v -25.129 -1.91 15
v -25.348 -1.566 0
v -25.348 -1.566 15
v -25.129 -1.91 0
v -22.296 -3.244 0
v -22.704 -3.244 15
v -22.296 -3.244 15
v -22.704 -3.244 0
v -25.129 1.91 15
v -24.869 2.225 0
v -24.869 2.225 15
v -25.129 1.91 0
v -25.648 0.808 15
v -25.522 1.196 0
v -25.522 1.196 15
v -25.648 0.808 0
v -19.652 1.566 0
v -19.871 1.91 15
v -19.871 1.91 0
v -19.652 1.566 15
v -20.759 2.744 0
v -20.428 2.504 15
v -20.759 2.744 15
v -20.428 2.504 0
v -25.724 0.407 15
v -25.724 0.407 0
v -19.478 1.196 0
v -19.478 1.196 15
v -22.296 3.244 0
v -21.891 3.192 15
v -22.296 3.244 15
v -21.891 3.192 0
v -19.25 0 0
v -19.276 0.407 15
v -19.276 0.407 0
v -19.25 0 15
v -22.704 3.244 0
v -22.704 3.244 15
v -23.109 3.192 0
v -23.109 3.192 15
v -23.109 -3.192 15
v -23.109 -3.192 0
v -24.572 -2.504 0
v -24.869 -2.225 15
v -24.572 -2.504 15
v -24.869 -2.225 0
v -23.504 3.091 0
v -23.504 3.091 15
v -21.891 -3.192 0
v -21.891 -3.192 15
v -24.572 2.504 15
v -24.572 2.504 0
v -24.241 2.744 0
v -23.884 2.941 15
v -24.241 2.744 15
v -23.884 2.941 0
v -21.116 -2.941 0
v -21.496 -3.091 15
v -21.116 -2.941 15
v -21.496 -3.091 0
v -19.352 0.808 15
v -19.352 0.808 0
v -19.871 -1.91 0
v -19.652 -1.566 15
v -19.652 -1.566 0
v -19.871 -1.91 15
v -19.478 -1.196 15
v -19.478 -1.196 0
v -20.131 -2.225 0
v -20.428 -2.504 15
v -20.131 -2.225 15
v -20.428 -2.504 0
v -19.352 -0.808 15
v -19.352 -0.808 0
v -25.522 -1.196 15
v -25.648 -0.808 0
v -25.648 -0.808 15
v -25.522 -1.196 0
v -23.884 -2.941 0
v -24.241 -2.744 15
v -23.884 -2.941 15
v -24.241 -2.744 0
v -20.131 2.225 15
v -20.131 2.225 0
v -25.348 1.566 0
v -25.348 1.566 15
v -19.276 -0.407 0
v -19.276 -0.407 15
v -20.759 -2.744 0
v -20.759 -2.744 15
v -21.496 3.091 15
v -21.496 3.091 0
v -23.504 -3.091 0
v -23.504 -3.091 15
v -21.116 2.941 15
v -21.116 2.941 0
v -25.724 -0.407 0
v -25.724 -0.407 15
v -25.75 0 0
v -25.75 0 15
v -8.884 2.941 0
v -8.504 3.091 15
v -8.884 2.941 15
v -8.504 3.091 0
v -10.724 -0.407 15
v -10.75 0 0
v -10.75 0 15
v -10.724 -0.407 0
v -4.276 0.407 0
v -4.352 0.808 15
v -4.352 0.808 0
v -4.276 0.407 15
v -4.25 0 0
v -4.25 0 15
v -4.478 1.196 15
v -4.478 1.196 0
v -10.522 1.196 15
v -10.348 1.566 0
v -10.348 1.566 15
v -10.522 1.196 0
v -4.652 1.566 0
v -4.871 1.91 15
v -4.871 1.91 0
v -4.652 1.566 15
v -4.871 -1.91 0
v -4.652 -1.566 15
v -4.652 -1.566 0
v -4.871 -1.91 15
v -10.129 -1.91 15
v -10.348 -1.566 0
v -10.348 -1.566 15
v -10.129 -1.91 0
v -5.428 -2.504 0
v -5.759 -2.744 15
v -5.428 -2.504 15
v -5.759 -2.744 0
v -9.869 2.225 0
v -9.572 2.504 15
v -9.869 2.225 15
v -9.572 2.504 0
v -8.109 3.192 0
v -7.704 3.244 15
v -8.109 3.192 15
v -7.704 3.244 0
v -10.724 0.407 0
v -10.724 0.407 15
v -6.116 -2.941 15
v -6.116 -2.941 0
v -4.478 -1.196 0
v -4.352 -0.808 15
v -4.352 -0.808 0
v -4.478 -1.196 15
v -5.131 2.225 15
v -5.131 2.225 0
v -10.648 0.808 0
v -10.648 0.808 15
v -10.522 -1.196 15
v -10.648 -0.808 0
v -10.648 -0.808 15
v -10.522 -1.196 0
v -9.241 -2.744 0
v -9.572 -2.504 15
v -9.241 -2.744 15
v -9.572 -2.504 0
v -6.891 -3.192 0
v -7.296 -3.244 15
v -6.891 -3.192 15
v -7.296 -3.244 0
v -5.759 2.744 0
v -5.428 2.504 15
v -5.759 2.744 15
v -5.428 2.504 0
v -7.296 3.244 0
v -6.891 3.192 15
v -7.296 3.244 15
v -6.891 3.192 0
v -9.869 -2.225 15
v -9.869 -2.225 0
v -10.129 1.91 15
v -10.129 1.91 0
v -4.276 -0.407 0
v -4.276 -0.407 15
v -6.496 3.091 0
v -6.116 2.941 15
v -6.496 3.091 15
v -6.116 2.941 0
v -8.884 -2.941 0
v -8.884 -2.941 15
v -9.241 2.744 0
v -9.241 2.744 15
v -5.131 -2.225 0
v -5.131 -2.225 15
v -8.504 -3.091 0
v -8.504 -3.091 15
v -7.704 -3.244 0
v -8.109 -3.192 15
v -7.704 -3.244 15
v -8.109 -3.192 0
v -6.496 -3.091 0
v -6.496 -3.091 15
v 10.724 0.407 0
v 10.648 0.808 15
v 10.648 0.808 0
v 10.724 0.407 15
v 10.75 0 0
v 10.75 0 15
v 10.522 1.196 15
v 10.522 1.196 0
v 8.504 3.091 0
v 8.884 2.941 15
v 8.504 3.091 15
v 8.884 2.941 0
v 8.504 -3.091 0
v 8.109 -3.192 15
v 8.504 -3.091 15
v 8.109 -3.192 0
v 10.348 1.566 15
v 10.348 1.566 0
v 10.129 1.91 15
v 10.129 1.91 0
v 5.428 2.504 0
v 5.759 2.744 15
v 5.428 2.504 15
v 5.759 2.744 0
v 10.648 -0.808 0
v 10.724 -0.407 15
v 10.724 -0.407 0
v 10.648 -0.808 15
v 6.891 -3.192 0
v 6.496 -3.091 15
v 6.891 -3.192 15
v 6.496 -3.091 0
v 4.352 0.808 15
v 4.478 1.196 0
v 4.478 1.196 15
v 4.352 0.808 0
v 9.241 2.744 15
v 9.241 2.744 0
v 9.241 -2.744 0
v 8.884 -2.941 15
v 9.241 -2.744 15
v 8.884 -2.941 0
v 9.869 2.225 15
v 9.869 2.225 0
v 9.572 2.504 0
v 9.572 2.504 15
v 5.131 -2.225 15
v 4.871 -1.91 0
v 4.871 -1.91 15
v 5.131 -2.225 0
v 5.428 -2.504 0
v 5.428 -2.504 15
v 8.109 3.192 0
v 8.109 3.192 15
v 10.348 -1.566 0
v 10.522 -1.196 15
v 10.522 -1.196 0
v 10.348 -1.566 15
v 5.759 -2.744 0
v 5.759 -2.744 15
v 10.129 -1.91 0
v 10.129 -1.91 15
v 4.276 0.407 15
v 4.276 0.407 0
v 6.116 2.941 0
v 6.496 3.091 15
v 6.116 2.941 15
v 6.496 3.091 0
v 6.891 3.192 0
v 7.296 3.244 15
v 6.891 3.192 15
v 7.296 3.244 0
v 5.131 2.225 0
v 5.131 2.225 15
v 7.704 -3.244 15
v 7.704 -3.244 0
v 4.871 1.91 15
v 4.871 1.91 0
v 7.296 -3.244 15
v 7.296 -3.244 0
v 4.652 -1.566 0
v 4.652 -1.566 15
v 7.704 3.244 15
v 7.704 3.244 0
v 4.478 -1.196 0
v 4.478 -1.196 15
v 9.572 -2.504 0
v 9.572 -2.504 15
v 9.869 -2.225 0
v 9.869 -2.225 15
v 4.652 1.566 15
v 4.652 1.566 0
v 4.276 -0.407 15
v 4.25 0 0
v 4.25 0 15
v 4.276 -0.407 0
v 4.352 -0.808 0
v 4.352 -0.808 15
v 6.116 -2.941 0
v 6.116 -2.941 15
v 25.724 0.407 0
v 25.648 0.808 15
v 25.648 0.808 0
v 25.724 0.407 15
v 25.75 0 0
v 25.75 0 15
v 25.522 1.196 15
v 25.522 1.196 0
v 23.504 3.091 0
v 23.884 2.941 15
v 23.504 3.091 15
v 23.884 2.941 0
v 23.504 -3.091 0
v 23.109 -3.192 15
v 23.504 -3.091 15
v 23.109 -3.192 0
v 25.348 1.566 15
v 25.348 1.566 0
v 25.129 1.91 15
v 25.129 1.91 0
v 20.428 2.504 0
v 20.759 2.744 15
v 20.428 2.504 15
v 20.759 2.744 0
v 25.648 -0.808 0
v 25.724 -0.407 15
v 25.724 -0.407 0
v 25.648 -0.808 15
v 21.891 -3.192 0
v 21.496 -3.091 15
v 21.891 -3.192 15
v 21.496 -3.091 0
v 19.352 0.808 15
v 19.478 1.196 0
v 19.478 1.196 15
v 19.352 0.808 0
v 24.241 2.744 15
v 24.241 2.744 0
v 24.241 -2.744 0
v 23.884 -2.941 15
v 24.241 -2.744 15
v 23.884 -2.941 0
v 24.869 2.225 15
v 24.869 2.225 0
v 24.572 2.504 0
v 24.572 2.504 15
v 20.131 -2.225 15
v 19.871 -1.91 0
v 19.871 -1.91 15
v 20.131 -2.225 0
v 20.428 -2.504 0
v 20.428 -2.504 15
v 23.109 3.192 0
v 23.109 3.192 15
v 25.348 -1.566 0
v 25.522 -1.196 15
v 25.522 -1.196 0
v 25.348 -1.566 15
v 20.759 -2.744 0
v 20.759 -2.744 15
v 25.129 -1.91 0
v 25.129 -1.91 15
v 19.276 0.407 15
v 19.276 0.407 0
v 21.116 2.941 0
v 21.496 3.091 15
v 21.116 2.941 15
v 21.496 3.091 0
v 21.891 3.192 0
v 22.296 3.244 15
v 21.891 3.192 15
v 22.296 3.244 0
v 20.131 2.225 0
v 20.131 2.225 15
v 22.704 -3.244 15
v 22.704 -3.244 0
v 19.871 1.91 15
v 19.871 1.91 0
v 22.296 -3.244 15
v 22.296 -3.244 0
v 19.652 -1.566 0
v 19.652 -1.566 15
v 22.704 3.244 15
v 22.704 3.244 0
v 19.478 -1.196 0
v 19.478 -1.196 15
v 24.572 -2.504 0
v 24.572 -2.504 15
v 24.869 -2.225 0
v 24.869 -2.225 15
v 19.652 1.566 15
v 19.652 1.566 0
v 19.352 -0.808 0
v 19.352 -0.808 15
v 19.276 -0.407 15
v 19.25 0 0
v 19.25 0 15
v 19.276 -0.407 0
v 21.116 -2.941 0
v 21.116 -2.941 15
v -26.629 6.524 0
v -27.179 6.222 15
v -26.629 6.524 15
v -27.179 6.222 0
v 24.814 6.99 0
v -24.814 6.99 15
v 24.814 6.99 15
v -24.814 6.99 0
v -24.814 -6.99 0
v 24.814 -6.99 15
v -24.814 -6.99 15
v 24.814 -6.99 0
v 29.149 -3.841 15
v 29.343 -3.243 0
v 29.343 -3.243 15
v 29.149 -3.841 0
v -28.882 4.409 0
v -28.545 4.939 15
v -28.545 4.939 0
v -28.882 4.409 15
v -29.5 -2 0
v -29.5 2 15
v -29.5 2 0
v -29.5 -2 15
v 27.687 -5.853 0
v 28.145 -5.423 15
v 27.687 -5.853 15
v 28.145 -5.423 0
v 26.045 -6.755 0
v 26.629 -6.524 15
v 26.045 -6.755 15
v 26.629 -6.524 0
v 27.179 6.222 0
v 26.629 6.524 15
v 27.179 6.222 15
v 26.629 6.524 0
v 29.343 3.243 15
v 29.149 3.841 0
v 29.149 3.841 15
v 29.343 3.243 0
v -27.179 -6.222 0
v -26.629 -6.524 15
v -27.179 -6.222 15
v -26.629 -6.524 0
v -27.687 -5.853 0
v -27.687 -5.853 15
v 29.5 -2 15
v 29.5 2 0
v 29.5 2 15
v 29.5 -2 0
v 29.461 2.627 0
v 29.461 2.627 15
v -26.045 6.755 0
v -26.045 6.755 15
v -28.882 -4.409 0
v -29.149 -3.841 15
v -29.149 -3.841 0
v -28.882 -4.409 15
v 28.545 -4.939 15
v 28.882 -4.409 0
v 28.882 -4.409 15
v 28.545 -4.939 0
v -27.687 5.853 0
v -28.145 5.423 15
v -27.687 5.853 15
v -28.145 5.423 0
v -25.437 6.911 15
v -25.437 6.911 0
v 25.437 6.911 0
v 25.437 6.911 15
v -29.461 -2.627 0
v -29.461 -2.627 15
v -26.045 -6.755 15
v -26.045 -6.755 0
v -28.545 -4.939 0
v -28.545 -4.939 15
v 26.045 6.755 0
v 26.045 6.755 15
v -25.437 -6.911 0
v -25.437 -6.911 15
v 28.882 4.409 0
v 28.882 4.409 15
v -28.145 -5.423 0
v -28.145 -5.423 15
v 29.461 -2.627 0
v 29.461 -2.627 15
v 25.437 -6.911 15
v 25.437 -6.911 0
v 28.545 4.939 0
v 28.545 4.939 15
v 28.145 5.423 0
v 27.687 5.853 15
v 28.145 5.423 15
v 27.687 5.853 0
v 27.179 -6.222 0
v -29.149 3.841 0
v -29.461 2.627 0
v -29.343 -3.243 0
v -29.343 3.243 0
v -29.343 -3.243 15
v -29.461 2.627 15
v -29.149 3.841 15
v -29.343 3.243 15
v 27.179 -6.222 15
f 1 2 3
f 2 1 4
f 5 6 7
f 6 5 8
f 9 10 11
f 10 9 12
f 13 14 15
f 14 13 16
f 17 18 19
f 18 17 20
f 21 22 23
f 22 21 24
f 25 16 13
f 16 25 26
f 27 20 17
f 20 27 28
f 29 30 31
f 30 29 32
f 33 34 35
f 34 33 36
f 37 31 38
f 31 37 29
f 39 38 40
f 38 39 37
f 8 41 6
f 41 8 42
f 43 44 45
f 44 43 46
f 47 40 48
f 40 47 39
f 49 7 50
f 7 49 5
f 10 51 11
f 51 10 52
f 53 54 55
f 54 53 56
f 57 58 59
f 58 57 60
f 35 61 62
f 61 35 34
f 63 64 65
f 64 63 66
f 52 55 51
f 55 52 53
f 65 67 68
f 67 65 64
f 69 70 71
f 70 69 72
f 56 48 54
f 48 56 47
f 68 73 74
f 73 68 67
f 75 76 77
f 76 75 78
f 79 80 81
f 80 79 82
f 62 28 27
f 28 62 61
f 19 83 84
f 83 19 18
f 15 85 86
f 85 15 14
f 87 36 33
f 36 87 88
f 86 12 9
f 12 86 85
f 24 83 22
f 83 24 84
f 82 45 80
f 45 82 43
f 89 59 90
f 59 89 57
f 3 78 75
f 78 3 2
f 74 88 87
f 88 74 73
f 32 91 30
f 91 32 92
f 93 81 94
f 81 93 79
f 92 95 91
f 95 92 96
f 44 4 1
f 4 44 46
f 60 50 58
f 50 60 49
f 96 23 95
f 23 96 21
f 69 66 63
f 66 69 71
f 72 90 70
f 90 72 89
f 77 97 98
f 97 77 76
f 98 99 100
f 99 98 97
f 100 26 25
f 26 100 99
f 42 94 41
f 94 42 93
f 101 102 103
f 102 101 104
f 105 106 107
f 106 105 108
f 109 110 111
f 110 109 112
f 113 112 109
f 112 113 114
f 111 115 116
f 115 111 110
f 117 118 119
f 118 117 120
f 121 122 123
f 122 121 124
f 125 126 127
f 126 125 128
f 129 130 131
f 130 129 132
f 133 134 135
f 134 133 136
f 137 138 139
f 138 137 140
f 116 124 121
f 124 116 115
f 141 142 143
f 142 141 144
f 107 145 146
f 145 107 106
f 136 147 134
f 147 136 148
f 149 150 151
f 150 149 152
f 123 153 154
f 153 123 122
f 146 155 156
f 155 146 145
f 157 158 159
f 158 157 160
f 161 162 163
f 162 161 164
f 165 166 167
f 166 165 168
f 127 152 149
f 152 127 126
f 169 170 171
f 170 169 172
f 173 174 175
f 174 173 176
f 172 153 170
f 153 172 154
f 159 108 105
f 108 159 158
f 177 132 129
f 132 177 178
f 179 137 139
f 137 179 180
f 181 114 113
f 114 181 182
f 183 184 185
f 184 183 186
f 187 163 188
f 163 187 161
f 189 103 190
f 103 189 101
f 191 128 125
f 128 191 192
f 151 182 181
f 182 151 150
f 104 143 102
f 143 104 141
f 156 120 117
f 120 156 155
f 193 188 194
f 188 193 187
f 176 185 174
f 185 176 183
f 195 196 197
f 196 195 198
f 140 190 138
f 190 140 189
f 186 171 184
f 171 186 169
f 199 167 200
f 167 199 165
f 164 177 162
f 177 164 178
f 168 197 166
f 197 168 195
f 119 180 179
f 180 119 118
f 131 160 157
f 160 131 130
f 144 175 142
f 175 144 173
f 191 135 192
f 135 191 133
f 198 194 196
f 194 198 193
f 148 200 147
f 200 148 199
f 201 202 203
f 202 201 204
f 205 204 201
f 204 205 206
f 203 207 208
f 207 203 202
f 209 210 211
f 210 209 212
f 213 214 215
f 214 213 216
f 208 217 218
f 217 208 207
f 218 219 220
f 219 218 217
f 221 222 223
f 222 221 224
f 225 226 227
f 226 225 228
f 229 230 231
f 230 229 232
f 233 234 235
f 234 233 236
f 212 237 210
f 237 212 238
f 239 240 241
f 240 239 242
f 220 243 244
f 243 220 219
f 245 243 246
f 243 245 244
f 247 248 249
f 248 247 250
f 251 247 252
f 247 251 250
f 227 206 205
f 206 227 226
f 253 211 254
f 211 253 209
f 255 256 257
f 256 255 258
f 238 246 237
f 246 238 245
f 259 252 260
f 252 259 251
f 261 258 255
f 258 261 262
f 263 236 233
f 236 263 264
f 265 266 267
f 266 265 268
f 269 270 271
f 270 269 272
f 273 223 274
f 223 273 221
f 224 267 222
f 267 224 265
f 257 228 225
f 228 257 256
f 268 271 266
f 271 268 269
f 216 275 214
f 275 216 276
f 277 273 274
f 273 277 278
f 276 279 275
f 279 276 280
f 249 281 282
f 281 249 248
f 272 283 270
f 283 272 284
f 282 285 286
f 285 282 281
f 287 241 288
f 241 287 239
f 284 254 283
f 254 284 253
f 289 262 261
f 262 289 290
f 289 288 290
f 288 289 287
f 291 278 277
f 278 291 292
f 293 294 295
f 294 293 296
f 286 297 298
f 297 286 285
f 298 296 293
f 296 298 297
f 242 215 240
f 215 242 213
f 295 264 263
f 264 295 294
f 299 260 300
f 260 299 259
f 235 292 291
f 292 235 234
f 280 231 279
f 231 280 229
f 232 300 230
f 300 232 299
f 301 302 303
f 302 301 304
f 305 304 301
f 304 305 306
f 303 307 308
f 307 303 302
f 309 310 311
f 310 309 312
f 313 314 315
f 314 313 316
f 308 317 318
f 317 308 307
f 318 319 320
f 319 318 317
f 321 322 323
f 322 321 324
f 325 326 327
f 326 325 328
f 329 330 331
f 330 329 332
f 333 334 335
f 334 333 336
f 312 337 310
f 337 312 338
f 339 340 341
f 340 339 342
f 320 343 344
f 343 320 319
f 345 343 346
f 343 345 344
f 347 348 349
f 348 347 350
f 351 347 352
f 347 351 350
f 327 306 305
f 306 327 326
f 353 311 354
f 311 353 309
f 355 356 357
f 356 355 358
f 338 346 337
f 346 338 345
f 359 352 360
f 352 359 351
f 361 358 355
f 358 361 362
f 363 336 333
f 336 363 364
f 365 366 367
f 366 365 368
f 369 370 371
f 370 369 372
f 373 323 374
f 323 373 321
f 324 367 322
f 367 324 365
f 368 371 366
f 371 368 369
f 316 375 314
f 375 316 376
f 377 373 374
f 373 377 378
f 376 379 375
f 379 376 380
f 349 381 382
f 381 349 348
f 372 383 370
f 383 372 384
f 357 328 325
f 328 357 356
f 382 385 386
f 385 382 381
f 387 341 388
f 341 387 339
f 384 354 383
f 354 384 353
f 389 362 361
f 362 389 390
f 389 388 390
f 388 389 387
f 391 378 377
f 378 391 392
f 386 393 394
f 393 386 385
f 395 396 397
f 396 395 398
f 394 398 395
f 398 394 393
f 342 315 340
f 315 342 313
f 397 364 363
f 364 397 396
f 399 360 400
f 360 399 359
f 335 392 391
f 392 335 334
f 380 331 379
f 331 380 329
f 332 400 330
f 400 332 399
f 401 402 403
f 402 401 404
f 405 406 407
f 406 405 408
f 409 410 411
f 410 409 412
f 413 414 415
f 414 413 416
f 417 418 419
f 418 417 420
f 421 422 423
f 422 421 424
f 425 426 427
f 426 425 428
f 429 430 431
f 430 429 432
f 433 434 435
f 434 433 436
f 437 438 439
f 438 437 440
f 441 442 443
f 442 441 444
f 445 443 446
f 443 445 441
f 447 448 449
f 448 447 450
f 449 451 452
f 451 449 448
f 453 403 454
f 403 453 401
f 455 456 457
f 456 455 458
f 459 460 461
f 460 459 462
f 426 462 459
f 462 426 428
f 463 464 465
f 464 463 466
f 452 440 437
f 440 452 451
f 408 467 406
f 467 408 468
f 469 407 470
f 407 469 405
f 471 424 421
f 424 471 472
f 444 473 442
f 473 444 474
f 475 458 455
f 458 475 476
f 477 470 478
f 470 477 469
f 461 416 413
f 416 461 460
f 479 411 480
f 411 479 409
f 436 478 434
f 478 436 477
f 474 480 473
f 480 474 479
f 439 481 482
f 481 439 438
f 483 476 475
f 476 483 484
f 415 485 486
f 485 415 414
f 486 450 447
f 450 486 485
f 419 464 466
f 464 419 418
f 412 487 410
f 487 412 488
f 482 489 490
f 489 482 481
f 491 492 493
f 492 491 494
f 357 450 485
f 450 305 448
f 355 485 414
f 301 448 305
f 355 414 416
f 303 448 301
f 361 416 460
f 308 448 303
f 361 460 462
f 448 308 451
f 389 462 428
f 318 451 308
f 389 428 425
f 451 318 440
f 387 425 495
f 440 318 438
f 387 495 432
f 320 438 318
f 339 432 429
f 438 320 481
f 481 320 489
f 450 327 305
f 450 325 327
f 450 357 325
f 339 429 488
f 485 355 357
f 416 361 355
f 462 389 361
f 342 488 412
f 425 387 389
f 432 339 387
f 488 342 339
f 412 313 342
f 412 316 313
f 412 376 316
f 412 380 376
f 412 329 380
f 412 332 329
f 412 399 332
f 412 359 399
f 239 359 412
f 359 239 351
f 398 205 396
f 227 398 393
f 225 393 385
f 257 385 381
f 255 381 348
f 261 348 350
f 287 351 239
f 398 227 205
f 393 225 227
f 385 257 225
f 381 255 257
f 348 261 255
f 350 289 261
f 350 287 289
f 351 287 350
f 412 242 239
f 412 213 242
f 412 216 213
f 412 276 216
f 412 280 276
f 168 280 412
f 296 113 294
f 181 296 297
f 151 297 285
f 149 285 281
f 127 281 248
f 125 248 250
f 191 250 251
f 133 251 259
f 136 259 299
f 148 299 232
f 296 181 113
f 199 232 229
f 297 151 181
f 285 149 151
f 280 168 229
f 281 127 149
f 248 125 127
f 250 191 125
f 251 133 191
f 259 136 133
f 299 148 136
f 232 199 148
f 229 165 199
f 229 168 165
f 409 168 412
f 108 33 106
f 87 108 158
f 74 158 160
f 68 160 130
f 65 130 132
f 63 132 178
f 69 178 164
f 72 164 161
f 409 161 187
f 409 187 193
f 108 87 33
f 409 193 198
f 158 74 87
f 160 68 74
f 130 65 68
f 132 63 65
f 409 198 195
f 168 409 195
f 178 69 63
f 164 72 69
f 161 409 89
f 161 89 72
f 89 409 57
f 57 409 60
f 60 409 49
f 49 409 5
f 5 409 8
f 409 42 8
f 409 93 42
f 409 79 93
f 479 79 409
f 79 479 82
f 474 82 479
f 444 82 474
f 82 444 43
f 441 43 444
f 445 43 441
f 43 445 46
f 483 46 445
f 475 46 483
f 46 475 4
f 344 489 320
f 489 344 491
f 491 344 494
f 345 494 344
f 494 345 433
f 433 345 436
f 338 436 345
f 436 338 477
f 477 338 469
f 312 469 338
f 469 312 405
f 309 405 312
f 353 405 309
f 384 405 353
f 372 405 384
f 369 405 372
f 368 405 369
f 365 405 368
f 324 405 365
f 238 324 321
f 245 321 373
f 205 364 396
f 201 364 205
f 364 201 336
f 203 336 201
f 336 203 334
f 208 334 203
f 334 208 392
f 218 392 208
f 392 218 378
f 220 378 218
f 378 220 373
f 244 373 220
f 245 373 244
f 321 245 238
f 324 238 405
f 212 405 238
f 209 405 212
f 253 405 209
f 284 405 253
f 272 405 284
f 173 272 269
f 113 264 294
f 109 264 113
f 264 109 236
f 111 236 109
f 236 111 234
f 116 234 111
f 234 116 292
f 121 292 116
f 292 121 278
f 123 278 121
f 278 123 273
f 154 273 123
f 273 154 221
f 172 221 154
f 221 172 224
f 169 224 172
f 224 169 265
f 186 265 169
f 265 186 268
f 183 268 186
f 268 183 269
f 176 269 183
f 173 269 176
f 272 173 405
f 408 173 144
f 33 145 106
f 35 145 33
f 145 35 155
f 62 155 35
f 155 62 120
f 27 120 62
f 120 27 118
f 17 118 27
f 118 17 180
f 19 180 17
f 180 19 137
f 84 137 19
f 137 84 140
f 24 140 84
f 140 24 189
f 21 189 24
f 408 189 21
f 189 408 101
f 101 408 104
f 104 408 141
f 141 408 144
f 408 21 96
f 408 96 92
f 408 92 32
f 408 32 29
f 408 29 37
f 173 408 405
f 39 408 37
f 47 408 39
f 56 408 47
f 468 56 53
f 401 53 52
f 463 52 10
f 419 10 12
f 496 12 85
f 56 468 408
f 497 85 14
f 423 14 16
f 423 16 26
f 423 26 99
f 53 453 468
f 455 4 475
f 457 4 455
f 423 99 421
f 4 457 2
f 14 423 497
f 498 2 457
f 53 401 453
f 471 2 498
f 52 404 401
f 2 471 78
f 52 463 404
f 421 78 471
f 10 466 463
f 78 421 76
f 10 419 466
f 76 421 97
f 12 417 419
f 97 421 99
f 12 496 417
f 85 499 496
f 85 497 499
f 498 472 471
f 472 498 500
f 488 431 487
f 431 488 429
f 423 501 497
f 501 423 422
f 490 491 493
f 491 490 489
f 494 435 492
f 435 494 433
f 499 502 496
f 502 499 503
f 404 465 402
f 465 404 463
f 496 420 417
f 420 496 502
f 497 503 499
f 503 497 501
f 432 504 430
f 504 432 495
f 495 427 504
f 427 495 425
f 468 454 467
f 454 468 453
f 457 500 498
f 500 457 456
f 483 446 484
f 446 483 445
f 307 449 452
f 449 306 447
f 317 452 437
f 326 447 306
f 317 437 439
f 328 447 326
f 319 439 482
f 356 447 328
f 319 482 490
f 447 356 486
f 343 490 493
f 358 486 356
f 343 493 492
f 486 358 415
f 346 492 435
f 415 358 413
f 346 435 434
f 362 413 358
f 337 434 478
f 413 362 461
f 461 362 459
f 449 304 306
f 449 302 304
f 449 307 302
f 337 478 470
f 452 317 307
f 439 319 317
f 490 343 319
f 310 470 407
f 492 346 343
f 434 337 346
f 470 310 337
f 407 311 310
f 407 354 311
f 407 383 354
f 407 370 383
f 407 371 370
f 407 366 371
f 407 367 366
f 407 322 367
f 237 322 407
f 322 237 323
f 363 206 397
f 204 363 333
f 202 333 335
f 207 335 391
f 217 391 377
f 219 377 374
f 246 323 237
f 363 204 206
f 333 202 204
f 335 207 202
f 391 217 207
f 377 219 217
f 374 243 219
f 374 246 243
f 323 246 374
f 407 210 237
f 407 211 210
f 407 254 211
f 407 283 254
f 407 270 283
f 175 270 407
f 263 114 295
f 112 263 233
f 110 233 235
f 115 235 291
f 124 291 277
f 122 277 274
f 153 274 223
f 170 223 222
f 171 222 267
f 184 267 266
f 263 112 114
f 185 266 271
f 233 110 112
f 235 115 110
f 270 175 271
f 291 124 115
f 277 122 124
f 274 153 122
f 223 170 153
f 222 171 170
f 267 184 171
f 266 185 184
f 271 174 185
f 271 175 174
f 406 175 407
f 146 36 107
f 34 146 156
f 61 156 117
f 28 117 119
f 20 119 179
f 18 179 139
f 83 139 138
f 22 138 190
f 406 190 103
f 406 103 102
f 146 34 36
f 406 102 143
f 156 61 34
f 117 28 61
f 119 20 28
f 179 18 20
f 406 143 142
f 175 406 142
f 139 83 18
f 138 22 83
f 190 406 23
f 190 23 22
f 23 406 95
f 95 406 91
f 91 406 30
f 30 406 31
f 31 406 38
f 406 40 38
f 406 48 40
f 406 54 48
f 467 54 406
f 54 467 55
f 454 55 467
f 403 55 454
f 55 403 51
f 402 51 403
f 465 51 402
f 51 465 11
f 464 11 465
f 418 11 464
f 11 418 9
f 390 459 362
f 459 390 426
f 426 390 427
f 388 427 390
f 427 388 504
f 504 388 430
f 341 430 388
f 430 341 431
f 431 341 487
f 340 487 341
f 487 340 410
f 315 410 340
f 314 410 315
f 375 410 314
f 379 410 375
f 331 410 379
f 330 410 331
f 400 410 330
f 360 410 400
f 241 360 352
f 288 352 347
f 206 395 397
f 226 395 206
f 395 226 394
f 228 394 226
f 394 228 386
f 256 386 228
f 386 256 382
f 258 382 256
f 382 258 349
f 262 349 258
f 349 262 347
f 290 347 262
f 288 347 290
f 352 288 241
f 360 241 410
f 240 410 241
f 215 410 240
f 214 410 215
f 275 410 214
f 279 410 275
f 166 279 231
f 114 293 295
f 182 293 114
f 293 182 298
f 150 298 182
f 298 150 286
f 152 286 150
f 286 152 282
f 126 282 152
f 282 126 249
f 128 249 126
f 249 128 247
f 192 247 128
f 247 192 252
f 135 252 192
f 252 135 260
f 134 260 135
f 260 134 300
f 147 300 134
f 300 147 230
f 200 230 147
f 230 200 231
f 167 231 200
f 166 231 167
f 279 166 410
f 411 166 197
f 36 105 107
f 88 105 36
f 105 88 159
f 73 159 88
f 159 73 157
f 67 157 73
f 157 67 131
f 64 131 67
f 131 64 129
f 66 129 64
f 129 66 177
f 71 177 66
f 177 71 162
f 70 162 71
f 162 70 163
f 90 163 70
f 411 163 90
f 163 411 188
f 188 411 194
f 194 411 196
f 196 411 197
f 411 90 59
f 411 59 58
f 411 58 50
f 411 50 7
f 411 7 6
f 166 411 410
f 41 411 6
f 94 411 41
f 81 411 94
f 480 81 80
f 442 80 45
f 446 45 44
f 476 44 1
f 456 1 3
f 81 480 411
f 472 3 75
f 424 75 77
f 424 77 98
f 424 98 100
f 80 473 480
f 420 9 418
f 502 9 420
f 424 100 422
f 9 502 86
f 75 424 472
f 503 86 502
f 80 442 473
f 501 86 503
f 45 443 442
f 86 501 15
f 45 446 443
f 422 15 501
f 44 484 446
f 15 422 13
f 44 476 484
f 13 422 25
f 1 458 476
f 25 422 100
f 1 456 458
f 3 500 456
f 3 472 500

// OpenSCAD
$fn = 50;


difference() {
	union() {
		hull() {
			translate(v = [-24.5000000000, 2.0000000000, 0]) {
				cylinder(h = 15, r = 5);
			}
			translate(v = [24.5000000000, 2.0000000000, 0]) {
				cylinder(h = 15, r = 5);
			}
			translate(v = [-24.5000000000, -2.0000000000, 0]) {
				cylinder(h = 15, r = 5);
			}
			translate(v = [24.5000000000, -2.0000000000, 0]) {
				cylinder(h = 15, r = 5);
			}
		}
	}
	union() {
		translate(v = [-22.5000000000, 0.0000000000, -100.0000000000]) {
			cylinder(h = 200, r = 3.2500000000);
		}
		translate(v = [-7.5000000000, 0.0000000000, -100.0000000000]) {
			cylinder(h = 200, r = 3.2500000000);
		}
		translate(v = [7.5000000000, 0.0000000000, -100.0000000000]) {
			cylinder(h = 200, r = 3.2500000000);
		}
		translate(v = [22.5000000000, 0.0000000000, -100.0000000000]) {
			cylinder(h = 200, r = 3.2500000000);
		}
	}
}
